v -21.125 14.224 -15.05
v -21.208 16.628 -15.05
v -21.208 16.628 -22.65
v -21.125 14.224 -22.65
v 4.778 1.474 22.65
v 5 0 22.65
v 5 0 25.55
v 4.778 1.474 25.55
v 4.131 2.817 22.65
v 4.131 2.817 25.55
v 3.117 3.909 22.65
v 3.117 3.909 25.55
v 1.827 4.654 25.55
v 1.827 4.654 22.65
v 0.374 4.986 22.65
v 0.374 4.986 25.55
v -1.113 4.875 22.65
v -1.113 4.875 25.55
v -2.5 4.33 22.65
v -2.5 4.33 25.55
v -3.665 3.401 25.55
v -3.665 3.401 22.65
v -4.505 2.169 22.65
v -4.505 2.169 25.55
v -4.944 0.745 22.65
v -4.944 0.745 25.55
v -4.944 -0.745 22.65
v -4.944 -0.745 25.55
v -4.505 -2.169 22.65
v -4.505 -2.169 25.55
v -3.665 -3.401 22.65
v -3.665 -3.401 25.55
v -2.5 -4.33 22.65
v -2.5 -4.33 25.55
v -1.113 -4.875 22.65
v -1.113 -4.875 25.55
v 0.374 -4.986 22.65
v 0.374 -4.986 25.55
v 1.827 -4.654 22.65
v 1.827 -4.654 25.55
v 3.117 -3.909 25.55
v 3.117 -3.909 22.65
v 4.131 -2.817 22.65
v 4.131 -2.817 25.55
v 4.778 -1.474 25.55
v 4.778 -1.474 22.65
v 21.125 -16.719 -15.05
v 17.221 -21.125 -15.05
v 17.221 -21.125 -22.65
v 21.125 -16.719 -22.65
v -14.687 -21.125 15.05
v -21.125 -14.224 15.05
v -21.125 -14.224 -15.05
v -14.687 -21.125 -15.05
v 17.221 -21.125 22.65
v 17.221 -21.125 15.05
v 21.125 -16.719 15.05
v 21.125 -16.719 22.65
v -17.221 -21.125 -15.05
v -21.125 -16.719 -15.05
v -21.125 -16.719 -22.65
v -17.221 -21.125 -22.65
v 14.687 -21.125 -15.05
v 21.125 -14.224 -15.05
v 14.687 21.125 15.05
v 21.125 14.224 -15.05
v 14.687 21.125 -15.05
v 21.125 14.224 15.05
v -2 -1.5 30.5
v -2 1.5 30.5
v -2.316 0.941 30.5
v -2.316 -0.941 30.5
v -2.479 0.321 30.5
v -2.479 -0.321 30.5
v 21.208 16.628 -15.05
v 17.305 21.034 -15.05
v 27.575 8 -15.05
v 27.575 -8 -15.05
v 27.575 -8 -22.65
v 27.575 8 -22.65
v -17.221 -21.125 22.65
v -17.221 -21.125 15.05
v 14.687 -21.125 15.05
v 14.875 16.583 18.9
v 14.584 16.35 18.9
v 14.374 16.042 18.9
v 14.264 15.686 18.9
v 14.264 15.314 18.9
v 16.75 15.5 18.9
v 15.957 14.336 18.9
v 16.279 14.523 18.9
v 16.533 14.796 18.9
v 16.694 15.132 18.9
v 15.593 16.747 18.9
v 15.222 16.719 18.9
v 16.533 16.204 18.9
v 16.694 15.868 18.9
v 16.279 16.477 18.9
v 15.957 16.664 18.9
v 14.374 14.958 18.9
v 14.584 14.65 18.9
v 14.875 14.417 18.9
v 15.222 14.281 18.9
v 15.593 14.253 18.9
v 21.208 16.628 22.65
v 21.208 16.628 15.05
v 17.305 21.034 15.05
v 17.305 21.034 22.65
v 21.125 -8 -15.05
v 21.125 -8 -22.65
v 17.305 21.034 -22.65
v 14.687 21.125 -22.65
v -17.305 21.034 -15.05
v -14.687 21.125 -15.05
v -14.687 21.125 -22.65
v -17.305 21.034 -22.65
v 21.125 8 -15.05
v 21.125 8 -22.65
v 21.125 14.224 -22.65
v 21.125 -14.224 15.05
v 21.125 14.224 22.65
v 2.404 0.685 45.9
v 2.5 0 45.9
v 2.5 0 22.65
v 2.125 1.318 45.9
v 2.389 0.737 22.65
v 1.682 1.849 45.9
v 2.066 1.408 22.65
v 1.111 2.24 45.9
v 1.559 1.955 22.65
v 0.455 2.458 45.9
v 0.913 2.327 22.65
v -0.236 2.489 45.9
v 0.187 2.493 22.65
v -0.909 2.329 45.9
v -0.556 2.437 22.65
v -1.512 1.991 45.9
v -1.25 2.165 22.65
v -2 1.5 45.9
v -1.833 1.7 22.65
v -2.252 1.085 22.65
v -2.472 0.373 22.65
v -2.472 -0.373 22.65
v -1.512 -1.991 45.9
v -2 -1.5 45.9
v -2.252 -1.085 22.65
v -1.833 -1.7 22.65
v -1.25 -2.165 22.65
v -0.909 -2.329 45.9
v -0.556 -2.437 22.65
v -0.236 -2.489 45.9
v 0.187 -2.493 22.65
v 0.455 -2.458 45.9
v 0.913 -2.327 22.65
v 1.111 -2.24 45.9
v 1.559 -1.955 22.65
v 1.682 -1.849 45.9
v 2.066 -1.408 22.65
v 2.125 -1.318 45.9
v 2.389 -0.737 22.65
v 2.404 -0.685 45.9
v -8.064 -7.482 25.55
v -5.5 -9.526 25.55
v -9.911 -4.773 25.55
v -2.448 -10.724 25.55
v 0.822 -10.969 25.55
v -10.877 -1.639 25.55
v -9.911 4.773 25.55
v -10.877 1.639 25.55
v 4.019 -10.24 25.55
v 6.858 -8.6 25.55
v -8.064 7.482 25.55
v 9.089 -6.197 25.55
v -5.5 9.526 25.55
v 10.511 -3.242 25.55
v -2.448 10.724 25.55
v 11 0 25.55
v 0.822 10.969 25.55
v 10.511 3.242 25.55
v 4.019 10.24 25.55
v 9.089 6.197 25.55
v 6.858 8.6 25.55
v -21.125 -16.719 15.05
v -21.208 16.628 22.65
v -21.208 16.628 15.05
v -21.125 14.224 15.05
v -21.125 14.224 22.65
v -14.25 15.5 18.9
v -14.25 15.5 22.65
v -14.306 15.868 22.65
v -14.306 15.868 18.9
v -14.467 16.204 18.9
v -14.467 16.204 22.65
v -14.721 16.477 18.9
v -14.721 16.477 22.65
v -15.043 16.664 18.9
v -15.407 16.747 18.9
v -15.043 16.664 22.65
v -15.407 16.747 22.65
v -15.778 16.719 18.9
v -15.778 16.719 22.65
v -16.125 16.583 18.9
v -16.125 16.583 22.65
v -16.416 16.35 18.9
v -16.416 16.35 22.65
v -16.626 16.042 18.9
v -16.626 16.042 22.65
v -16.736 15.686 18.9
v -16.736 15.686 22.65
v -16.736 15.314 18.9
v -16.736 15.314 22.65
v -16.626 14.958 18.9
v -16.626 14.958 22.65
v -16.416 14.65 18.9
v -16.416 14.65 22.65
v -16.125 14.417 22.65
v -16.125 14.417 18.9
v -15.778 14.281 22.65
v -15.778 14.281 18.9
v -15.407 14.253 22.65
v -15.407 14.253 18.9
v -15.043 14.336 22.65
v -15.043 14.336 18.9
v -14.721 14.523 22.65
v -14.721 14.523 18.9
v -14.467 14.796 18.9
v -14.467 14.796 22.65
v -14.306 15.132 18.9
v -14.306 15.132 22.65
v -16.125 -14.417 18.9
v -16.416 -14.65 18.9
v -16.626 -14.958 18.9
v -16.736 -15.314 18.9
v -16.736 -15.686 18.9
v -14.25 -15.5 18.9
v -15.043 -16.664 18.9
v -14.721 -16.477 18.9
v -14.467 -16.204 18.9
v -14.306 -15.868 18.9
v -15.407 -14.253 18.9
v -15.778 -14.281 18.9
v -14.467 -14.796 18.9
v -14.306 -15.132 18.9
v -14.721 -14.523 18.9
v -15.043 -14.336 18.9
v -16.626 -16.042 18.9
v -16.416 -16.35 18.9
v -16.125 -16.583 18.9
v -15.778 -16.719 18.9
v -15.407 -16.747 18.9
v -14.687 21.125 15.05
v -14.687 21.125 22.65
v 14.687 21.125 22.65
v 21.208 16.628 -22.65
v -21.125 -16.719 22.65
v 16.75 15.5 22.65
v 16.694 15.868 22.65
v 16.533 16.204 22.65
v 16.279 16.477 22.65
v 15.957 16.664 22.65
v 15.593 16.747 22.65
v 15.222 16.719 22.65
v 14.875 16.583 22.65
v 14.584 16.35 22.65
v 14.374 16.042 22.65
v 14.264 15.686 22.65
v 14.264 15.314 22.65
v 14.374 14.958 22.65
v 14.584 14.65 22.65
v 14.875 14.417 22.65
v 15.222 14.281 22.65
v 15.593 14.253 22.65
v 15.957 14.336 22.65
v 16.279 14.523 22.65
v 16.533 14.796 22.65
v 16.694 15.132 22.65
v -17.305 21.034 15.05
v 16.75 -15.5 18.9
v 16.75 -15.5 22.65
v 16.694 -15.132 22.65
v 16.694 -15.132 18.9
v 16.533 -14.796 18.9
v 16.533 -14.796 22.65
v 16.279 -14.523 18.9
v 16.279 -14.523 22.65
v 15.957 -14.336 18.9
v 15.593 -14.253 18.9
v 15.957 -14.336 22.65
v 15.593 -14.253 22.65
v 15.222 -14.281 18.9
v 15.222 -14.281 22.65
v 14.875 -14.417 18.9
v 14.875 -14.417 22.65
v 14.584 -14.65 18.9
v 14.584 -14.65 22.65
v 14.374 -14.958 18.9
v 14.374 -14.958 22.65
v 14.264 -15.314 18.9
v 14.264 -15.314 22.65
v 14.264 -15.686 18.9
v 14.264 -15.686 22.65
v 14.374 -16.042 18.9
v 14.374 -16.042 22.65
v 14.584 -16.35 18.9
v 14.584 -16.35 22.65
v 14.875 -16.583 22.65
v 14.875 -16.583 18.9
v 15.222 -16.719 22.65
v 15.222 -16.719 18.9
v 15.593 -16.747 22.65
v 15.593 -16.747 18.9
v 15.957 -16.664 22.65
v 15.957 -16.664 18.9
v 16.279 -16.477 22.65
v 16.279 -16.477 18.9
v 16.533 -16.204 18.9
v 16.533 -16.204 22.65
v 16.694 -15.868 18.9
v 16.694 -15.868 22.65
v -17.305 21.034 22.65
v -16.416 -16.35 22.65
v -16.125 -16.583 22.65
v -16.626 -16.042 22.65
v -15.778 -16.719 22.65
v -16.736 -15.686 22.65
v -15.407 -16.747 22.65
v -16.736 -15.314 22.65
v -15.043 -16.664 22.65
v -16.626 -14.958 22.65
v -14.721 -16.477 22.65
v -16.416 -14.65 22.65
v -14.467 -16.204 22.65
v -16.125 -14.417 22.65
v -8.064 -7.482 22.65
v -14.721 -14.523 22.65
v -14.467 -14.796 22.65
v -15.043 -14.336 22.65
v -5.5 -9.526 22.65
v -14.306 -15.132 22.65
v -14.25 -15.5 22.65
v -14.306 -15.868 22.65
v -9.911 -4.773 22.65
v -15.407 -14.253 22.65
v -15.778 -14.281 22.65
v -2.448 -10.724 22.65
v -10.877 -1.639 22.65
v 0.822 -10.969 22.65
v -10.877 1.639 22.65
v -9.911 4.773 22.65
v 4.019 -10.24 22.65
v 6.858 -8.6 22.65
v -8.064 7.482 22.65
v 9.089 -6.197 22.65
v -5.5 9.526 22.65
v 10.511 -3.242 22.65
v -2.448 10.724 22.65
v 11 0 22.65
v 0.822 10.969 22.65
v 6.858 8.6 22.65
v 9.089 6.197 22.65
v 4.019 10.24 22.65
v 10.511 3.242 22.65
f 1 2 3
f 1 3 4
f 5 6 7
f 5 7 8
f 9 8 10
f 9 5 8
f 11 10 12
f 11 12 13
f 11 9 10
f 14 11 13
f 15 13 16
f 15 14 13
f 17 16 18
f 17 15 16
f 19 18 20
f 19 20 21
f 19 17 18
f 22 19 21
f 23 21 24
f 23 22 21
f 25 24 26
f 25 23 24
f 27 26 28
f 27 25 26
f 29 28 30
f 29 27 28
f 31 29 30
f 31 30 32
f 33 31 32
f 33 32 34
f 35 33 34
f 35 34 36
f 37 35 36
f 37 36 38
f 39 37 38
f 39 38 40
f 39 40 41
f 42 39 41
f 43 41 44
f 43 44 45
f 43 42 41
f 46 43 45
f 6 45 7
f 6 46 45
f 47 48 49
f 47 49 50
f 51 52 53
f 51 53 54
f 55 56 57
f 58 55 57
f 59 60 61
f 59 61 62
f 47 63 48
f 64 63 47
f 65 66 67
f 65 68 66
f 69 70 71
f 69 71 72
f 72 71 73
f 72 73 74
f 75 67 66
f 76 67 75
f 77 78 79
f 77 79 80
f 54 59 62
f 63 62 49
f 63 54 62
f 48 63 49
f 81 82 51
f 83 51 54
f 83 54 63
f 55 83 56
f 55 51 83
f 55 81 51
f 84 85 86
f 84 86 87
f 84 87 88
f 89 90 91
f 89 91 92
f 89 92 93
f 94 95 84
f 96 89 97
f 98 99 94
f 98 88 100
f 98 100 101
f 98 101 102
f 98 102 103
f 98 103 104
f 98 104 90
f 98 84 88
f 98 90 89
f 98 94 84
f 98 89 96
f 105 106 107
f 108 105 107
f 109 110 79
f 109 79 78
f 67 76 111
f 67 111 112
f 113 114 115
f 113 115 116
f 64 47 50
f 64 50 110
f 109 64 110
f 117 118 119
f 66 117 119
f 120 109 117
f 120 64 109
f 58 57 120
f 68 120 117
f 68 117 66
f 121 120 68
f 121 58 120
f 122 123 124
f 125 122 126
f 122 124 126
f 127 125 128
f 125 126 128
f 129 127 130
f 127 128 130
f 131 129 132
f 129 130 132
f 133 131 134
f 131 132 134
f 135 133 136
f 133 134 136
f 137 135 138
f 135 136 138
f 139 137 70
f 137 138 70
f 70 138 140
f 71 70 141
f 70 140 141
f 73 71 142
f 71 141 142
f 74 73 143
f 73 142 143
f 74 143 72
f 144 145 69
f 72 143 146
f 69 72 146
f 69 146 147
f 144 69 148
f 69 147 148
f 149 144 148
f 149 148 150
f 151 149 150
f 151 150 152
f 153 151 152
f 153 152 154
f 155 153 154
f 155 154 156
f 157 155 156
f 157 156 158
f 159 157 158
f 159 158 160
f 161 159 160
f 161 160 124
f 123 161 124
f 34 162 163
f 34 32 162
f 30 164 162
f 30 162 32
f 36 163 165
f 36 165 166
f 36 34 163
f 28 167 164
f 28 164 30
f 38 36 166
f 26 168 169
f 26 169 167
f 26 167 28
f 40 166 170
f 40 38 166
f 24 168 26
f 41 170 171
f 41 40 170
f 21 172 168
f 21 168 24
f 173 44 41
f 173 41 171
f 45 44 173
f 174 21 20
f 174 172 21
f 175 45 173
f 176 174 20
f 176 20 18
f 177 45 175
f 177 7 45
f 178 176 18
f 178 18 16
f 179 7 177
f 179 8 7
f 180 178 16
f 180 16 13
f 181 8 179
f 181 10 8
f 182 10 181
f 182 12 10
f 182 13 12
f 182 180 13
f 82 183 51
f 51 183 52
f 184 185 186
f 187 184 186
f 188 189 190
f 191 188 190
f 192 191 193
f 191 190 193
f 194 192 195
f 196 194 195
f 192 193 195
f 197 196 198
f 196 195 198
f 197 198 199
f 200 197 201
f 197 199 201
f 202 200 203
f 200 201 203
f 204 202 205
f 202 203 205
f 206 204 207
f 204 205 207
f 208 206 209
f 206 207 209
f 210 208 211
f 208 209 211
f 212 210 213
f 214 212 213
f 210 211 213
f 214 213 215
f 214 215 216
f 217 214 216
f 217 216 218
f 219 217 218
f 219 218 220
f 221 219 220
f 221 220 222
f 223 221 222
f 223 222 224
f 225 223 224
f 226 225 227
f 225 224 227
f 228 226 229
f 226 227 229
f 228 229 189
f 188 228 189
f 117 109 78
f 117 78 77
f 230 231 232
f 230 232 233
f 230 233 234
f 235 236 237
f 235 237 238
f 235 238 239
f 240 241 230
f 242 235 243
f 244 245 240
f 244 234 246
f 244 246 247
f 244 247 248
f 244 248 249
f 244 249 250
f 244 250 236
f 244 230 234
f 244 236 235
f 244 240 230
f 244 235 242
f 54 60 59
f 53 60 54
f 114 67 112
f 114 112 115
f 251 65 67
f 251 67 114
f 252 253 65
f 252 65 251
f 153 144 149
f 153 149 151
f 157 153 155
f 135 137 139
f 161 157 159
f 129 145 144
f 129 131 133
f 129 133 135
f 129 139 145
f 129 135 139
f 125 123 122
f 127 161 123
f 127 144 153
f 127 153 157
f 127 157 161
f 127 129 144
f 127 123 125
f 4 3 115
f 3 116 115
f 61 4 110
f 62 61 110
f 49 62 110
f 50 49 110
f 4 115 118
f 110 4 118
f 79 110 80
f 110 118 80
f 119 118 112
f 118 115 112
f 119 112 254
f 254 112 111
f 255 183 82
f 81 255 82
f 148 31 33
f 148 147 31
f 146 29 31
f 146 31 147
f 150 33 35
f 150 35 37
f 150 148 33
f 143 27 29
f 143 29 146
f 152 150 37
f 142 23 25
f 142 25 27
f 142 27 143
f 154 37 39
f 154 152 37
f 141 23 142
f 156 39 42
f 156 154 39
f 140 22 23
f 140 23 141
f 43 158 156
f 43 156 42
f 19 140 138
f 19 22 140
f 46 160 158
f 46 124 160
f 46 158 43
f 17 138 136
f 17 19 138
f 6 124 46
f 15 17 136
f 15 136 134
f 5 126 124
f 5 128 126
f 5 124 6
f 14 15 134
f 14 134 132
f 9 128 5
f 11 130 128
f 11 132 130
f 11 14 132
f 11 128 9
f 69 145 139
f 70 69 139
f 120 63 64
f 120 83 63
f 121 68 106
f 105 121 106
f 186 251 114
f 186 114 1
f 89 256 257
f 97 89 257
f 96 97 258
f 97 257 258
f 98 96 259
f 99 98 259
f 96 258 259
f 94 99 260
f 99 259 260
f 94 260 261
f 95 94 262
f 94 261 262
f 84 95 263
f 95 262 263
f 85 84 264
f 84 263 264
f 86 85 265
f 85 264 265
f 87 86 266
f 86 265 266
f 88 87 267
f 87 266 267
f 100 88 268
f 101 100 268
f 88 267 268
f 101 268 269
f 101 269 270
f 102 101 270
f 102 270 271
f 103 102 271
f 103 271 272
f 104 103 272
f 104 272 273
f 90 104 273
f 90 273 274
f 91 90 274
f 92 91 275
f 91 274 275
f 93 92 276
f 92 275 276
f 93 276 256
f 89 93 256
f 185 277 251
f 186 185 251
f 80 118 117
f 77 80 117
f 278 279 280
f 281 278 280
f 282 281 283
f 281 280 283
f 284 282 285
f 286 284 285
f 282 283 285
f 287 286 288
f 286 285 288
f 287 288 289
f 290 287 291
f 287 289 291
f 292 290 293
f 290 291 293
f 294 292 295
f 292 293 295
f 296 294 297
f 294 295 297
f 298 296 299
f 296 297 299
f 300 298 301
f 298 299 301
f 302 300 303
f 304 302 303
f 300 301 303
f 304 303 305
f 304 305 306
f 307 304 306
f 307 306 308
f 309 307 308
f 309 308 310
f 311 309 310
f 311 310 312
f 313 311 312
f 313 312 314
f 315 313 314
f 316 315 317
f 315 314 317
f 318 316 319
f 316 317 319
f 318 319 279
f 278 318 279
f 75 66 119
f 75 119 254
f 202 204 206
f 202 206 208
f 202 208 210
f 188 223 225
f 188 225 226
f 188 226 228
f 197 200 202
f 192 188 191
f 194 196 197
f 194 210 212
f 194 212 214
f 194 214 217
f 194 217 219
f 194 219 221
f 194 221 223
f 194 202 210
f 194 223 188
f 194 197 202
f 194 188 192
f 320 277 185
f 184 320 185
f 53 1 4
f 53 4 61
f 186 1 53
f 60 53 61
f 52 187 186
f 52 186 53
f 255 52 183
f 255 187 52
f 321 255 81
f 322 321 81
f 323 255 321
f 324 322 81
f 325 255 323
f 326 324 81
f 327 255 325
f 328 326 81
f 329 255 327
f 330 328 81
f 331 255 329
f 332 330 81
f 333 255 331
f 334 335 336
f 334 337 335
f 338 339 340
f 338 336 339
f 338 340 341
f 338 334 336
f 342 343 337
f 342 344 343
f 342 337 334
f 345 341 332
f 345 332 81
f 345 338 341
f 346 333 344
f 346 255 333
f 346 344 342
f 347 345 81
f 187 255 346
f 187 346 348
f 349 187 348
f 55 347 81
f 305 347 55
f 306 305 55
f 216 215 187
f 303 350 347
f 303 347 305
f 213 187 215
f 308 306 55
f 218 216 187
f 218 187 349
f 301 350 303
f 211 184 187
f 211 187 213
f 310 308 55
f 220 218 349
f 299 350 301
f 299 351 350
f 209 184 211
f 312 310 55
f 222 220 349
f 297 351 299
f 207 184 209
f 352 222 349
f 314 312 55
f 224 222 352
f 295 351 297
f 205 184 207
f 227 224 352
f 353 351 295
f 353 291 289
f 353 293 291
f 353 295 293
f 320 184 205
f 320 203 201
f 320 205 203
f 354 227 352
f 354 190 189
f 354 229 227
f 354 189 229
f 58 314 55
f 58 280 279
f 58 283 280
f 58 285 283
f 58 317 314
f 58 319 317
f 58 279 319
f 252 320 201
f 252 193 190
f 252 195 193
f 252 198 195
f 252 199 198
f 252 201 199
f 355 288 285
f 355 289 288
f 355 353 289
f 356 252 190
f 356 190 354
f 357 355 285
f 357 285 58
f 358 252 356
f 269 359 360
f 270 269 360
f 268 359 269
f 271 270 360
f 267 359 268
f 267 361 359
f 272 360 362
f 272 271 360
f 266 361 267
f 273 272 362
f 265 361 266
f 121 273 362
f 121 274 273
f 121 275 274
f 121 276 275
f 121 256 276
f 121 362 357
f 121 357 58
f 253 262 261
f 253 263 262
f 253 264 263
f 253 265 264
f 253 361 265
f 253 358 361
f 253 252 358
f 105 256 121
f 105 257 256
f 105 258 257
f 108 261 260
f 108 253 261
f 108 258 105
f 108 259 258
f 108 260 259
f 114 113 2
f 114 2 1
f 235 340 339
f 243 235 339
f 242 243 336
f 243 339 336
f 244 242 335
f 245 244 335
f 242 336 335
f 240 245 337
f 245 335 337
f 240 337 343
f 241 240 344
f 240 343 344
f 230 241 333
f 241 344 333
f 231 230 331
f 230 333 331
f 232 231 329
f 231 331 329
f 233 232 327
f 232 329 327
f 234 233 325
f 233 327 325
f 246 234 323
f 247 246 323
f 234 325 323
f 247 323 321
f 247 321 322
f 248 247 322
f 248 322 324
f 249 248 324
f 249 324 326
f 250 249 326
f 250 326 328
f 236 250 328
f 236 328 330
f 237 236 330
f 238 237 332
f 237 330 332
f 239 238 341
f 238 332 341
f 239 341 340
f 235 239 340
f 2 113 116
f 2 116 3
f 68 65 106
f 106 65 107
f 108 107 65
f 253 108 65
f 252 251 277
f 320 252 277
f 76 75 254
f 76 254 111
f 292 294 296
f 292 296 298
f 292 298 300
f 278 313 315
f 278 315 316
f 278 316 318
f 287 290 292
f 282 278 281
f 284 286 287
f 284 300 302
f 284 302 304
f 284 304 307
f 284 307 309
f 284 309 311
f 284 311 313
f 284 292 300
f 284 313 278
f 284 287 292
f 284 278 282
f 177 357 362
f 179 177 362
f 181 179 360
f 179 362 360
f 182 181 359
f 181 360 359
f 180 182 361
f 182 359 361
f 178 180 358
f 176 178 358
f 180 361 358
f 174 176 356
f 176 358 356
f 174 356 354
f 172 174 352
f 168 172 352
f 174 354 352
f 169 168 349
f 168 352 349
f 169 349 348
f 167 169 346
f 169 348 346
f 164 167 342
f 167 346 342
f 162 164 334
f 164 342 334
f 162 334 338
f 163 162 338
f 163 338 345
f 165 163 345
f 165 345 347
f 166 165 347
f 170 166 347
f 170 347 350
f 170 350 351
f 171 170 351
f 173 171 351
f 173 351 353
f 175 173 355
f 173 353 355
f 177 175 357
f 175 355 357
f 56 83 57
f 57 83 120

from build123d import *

# Parameters (mm, degrees)
F1_DEPTH  = 15.05
F3_DEPTH  = 7.6
F5_R      = 11
F5_R_2    = 5
F6_DEPTH  = 2.9
F5_R_3    = 2.5
F7_DEPTH  = 23.25
F9_DEPTH  = 15.4
F10_W     = 16
F10_H     = 7.6
F11_DEPTH = 6.45
F5_R_4    = 1.25
F12_DEPTH = 3.75


with BuildPart() as f1:
    # F0 (on Top) → F1 (new body, symmetric)
    with BuildSketch(Plane.XY):
        Polygon((21.125, 14.2244820946), (14.6871989155, 21.125), (-14.6871989155, 21.125), (-21.125, 14.2244820946), (-21.125, -14.2244820946), (-14.6871989155, -21.125), (14.6871989155, -21.125), (21.125, -14.2244820946), align=None)
    extrude(amount=F1_DEPTH, both=True)

    # F2 (on face) → F3 (join)
    with BuildSketch(Plane.XY.offset(15.05)):
        Polygon((-21.2083792326, 16.6279797649), (-21.125, 14.2244820946), (-21.125, -14.2244820946), (-21.125, -16.7187881371), (-17.2214704386, -21.125), (-14.6871989155, -21.125), (14.6871989155, -21.125), (17.2214704386, -21.125), (21.125, -16.7187881371), (21.125, -14.2244820946), (21.125, 14.2244820946), (21.2083792326, 16.6279797649), (17.3048496711, 21.0341916278), (14.6871989155, 21.125), (-14.6871989155, 21.125), (-17.3048496711, 21.0341916278), align=None)
    extrude(amount=F3_DEPTH)

    # F4: F1 across plane


with BuildPart() as f1_1:
    add(f1.part)
    add(f1.part.mirror(Plane.XY))

    # F5 (on face) → F6 (join)
    with BuildSketch(Plane.XY.offset(22.65)):
        Circle(F5_R)
        Circle(F5_R_2, mode=Mode.SUBTRACT)
    extrude(amount=F6_DEPTH)

    # F5 (on face) → F7 (join)
    with BuildSketch(Plane.XY.offset(22.65)):
        Circle(F5_R_3)
    extrude(amount=F7_DEPTH)

    # F8 (on face) → F9 (cut)
    with BuildSketch(Plane.XY.offset(45.9)):
        with BuildLine():
            ThreePointArc((-2, 1.5), (-2.5, 0), (-2, -1.5))
            Line((-2, -1.5), (-2, 1.5))
        make_face()
    extrude(amount=-F9_DEPTH, mode=Mode.SUBTRACT)

    # F10 (on face) → F11 (join)
    with BuildSketch(Plane.YZ.offset(21.125)):
        with Locations((0, -18.85)):
            Rectangle(F10_W, F10_H)
    extrude(amount=F11_DEPTH)

    # F5 (on face) → F12 (cut)
    with BuildSketch(Plane.XY.offset(22.65)):
        with Locations((-15.5, -15.5)):
            Circle(F5_R_4)
        with Locations((15.5, -15.5)):
            Circle(F5_R_4)
        with Locations((15.5, 15.5)):
            Circle(F5_R_4)
        with Locations((-15.5, 15.5)):
            Circle(F5_R_4)
    extrude(amount=-F12_DEPTH, mode=Mode.SUBTRACT)


solid = f1_1.part
